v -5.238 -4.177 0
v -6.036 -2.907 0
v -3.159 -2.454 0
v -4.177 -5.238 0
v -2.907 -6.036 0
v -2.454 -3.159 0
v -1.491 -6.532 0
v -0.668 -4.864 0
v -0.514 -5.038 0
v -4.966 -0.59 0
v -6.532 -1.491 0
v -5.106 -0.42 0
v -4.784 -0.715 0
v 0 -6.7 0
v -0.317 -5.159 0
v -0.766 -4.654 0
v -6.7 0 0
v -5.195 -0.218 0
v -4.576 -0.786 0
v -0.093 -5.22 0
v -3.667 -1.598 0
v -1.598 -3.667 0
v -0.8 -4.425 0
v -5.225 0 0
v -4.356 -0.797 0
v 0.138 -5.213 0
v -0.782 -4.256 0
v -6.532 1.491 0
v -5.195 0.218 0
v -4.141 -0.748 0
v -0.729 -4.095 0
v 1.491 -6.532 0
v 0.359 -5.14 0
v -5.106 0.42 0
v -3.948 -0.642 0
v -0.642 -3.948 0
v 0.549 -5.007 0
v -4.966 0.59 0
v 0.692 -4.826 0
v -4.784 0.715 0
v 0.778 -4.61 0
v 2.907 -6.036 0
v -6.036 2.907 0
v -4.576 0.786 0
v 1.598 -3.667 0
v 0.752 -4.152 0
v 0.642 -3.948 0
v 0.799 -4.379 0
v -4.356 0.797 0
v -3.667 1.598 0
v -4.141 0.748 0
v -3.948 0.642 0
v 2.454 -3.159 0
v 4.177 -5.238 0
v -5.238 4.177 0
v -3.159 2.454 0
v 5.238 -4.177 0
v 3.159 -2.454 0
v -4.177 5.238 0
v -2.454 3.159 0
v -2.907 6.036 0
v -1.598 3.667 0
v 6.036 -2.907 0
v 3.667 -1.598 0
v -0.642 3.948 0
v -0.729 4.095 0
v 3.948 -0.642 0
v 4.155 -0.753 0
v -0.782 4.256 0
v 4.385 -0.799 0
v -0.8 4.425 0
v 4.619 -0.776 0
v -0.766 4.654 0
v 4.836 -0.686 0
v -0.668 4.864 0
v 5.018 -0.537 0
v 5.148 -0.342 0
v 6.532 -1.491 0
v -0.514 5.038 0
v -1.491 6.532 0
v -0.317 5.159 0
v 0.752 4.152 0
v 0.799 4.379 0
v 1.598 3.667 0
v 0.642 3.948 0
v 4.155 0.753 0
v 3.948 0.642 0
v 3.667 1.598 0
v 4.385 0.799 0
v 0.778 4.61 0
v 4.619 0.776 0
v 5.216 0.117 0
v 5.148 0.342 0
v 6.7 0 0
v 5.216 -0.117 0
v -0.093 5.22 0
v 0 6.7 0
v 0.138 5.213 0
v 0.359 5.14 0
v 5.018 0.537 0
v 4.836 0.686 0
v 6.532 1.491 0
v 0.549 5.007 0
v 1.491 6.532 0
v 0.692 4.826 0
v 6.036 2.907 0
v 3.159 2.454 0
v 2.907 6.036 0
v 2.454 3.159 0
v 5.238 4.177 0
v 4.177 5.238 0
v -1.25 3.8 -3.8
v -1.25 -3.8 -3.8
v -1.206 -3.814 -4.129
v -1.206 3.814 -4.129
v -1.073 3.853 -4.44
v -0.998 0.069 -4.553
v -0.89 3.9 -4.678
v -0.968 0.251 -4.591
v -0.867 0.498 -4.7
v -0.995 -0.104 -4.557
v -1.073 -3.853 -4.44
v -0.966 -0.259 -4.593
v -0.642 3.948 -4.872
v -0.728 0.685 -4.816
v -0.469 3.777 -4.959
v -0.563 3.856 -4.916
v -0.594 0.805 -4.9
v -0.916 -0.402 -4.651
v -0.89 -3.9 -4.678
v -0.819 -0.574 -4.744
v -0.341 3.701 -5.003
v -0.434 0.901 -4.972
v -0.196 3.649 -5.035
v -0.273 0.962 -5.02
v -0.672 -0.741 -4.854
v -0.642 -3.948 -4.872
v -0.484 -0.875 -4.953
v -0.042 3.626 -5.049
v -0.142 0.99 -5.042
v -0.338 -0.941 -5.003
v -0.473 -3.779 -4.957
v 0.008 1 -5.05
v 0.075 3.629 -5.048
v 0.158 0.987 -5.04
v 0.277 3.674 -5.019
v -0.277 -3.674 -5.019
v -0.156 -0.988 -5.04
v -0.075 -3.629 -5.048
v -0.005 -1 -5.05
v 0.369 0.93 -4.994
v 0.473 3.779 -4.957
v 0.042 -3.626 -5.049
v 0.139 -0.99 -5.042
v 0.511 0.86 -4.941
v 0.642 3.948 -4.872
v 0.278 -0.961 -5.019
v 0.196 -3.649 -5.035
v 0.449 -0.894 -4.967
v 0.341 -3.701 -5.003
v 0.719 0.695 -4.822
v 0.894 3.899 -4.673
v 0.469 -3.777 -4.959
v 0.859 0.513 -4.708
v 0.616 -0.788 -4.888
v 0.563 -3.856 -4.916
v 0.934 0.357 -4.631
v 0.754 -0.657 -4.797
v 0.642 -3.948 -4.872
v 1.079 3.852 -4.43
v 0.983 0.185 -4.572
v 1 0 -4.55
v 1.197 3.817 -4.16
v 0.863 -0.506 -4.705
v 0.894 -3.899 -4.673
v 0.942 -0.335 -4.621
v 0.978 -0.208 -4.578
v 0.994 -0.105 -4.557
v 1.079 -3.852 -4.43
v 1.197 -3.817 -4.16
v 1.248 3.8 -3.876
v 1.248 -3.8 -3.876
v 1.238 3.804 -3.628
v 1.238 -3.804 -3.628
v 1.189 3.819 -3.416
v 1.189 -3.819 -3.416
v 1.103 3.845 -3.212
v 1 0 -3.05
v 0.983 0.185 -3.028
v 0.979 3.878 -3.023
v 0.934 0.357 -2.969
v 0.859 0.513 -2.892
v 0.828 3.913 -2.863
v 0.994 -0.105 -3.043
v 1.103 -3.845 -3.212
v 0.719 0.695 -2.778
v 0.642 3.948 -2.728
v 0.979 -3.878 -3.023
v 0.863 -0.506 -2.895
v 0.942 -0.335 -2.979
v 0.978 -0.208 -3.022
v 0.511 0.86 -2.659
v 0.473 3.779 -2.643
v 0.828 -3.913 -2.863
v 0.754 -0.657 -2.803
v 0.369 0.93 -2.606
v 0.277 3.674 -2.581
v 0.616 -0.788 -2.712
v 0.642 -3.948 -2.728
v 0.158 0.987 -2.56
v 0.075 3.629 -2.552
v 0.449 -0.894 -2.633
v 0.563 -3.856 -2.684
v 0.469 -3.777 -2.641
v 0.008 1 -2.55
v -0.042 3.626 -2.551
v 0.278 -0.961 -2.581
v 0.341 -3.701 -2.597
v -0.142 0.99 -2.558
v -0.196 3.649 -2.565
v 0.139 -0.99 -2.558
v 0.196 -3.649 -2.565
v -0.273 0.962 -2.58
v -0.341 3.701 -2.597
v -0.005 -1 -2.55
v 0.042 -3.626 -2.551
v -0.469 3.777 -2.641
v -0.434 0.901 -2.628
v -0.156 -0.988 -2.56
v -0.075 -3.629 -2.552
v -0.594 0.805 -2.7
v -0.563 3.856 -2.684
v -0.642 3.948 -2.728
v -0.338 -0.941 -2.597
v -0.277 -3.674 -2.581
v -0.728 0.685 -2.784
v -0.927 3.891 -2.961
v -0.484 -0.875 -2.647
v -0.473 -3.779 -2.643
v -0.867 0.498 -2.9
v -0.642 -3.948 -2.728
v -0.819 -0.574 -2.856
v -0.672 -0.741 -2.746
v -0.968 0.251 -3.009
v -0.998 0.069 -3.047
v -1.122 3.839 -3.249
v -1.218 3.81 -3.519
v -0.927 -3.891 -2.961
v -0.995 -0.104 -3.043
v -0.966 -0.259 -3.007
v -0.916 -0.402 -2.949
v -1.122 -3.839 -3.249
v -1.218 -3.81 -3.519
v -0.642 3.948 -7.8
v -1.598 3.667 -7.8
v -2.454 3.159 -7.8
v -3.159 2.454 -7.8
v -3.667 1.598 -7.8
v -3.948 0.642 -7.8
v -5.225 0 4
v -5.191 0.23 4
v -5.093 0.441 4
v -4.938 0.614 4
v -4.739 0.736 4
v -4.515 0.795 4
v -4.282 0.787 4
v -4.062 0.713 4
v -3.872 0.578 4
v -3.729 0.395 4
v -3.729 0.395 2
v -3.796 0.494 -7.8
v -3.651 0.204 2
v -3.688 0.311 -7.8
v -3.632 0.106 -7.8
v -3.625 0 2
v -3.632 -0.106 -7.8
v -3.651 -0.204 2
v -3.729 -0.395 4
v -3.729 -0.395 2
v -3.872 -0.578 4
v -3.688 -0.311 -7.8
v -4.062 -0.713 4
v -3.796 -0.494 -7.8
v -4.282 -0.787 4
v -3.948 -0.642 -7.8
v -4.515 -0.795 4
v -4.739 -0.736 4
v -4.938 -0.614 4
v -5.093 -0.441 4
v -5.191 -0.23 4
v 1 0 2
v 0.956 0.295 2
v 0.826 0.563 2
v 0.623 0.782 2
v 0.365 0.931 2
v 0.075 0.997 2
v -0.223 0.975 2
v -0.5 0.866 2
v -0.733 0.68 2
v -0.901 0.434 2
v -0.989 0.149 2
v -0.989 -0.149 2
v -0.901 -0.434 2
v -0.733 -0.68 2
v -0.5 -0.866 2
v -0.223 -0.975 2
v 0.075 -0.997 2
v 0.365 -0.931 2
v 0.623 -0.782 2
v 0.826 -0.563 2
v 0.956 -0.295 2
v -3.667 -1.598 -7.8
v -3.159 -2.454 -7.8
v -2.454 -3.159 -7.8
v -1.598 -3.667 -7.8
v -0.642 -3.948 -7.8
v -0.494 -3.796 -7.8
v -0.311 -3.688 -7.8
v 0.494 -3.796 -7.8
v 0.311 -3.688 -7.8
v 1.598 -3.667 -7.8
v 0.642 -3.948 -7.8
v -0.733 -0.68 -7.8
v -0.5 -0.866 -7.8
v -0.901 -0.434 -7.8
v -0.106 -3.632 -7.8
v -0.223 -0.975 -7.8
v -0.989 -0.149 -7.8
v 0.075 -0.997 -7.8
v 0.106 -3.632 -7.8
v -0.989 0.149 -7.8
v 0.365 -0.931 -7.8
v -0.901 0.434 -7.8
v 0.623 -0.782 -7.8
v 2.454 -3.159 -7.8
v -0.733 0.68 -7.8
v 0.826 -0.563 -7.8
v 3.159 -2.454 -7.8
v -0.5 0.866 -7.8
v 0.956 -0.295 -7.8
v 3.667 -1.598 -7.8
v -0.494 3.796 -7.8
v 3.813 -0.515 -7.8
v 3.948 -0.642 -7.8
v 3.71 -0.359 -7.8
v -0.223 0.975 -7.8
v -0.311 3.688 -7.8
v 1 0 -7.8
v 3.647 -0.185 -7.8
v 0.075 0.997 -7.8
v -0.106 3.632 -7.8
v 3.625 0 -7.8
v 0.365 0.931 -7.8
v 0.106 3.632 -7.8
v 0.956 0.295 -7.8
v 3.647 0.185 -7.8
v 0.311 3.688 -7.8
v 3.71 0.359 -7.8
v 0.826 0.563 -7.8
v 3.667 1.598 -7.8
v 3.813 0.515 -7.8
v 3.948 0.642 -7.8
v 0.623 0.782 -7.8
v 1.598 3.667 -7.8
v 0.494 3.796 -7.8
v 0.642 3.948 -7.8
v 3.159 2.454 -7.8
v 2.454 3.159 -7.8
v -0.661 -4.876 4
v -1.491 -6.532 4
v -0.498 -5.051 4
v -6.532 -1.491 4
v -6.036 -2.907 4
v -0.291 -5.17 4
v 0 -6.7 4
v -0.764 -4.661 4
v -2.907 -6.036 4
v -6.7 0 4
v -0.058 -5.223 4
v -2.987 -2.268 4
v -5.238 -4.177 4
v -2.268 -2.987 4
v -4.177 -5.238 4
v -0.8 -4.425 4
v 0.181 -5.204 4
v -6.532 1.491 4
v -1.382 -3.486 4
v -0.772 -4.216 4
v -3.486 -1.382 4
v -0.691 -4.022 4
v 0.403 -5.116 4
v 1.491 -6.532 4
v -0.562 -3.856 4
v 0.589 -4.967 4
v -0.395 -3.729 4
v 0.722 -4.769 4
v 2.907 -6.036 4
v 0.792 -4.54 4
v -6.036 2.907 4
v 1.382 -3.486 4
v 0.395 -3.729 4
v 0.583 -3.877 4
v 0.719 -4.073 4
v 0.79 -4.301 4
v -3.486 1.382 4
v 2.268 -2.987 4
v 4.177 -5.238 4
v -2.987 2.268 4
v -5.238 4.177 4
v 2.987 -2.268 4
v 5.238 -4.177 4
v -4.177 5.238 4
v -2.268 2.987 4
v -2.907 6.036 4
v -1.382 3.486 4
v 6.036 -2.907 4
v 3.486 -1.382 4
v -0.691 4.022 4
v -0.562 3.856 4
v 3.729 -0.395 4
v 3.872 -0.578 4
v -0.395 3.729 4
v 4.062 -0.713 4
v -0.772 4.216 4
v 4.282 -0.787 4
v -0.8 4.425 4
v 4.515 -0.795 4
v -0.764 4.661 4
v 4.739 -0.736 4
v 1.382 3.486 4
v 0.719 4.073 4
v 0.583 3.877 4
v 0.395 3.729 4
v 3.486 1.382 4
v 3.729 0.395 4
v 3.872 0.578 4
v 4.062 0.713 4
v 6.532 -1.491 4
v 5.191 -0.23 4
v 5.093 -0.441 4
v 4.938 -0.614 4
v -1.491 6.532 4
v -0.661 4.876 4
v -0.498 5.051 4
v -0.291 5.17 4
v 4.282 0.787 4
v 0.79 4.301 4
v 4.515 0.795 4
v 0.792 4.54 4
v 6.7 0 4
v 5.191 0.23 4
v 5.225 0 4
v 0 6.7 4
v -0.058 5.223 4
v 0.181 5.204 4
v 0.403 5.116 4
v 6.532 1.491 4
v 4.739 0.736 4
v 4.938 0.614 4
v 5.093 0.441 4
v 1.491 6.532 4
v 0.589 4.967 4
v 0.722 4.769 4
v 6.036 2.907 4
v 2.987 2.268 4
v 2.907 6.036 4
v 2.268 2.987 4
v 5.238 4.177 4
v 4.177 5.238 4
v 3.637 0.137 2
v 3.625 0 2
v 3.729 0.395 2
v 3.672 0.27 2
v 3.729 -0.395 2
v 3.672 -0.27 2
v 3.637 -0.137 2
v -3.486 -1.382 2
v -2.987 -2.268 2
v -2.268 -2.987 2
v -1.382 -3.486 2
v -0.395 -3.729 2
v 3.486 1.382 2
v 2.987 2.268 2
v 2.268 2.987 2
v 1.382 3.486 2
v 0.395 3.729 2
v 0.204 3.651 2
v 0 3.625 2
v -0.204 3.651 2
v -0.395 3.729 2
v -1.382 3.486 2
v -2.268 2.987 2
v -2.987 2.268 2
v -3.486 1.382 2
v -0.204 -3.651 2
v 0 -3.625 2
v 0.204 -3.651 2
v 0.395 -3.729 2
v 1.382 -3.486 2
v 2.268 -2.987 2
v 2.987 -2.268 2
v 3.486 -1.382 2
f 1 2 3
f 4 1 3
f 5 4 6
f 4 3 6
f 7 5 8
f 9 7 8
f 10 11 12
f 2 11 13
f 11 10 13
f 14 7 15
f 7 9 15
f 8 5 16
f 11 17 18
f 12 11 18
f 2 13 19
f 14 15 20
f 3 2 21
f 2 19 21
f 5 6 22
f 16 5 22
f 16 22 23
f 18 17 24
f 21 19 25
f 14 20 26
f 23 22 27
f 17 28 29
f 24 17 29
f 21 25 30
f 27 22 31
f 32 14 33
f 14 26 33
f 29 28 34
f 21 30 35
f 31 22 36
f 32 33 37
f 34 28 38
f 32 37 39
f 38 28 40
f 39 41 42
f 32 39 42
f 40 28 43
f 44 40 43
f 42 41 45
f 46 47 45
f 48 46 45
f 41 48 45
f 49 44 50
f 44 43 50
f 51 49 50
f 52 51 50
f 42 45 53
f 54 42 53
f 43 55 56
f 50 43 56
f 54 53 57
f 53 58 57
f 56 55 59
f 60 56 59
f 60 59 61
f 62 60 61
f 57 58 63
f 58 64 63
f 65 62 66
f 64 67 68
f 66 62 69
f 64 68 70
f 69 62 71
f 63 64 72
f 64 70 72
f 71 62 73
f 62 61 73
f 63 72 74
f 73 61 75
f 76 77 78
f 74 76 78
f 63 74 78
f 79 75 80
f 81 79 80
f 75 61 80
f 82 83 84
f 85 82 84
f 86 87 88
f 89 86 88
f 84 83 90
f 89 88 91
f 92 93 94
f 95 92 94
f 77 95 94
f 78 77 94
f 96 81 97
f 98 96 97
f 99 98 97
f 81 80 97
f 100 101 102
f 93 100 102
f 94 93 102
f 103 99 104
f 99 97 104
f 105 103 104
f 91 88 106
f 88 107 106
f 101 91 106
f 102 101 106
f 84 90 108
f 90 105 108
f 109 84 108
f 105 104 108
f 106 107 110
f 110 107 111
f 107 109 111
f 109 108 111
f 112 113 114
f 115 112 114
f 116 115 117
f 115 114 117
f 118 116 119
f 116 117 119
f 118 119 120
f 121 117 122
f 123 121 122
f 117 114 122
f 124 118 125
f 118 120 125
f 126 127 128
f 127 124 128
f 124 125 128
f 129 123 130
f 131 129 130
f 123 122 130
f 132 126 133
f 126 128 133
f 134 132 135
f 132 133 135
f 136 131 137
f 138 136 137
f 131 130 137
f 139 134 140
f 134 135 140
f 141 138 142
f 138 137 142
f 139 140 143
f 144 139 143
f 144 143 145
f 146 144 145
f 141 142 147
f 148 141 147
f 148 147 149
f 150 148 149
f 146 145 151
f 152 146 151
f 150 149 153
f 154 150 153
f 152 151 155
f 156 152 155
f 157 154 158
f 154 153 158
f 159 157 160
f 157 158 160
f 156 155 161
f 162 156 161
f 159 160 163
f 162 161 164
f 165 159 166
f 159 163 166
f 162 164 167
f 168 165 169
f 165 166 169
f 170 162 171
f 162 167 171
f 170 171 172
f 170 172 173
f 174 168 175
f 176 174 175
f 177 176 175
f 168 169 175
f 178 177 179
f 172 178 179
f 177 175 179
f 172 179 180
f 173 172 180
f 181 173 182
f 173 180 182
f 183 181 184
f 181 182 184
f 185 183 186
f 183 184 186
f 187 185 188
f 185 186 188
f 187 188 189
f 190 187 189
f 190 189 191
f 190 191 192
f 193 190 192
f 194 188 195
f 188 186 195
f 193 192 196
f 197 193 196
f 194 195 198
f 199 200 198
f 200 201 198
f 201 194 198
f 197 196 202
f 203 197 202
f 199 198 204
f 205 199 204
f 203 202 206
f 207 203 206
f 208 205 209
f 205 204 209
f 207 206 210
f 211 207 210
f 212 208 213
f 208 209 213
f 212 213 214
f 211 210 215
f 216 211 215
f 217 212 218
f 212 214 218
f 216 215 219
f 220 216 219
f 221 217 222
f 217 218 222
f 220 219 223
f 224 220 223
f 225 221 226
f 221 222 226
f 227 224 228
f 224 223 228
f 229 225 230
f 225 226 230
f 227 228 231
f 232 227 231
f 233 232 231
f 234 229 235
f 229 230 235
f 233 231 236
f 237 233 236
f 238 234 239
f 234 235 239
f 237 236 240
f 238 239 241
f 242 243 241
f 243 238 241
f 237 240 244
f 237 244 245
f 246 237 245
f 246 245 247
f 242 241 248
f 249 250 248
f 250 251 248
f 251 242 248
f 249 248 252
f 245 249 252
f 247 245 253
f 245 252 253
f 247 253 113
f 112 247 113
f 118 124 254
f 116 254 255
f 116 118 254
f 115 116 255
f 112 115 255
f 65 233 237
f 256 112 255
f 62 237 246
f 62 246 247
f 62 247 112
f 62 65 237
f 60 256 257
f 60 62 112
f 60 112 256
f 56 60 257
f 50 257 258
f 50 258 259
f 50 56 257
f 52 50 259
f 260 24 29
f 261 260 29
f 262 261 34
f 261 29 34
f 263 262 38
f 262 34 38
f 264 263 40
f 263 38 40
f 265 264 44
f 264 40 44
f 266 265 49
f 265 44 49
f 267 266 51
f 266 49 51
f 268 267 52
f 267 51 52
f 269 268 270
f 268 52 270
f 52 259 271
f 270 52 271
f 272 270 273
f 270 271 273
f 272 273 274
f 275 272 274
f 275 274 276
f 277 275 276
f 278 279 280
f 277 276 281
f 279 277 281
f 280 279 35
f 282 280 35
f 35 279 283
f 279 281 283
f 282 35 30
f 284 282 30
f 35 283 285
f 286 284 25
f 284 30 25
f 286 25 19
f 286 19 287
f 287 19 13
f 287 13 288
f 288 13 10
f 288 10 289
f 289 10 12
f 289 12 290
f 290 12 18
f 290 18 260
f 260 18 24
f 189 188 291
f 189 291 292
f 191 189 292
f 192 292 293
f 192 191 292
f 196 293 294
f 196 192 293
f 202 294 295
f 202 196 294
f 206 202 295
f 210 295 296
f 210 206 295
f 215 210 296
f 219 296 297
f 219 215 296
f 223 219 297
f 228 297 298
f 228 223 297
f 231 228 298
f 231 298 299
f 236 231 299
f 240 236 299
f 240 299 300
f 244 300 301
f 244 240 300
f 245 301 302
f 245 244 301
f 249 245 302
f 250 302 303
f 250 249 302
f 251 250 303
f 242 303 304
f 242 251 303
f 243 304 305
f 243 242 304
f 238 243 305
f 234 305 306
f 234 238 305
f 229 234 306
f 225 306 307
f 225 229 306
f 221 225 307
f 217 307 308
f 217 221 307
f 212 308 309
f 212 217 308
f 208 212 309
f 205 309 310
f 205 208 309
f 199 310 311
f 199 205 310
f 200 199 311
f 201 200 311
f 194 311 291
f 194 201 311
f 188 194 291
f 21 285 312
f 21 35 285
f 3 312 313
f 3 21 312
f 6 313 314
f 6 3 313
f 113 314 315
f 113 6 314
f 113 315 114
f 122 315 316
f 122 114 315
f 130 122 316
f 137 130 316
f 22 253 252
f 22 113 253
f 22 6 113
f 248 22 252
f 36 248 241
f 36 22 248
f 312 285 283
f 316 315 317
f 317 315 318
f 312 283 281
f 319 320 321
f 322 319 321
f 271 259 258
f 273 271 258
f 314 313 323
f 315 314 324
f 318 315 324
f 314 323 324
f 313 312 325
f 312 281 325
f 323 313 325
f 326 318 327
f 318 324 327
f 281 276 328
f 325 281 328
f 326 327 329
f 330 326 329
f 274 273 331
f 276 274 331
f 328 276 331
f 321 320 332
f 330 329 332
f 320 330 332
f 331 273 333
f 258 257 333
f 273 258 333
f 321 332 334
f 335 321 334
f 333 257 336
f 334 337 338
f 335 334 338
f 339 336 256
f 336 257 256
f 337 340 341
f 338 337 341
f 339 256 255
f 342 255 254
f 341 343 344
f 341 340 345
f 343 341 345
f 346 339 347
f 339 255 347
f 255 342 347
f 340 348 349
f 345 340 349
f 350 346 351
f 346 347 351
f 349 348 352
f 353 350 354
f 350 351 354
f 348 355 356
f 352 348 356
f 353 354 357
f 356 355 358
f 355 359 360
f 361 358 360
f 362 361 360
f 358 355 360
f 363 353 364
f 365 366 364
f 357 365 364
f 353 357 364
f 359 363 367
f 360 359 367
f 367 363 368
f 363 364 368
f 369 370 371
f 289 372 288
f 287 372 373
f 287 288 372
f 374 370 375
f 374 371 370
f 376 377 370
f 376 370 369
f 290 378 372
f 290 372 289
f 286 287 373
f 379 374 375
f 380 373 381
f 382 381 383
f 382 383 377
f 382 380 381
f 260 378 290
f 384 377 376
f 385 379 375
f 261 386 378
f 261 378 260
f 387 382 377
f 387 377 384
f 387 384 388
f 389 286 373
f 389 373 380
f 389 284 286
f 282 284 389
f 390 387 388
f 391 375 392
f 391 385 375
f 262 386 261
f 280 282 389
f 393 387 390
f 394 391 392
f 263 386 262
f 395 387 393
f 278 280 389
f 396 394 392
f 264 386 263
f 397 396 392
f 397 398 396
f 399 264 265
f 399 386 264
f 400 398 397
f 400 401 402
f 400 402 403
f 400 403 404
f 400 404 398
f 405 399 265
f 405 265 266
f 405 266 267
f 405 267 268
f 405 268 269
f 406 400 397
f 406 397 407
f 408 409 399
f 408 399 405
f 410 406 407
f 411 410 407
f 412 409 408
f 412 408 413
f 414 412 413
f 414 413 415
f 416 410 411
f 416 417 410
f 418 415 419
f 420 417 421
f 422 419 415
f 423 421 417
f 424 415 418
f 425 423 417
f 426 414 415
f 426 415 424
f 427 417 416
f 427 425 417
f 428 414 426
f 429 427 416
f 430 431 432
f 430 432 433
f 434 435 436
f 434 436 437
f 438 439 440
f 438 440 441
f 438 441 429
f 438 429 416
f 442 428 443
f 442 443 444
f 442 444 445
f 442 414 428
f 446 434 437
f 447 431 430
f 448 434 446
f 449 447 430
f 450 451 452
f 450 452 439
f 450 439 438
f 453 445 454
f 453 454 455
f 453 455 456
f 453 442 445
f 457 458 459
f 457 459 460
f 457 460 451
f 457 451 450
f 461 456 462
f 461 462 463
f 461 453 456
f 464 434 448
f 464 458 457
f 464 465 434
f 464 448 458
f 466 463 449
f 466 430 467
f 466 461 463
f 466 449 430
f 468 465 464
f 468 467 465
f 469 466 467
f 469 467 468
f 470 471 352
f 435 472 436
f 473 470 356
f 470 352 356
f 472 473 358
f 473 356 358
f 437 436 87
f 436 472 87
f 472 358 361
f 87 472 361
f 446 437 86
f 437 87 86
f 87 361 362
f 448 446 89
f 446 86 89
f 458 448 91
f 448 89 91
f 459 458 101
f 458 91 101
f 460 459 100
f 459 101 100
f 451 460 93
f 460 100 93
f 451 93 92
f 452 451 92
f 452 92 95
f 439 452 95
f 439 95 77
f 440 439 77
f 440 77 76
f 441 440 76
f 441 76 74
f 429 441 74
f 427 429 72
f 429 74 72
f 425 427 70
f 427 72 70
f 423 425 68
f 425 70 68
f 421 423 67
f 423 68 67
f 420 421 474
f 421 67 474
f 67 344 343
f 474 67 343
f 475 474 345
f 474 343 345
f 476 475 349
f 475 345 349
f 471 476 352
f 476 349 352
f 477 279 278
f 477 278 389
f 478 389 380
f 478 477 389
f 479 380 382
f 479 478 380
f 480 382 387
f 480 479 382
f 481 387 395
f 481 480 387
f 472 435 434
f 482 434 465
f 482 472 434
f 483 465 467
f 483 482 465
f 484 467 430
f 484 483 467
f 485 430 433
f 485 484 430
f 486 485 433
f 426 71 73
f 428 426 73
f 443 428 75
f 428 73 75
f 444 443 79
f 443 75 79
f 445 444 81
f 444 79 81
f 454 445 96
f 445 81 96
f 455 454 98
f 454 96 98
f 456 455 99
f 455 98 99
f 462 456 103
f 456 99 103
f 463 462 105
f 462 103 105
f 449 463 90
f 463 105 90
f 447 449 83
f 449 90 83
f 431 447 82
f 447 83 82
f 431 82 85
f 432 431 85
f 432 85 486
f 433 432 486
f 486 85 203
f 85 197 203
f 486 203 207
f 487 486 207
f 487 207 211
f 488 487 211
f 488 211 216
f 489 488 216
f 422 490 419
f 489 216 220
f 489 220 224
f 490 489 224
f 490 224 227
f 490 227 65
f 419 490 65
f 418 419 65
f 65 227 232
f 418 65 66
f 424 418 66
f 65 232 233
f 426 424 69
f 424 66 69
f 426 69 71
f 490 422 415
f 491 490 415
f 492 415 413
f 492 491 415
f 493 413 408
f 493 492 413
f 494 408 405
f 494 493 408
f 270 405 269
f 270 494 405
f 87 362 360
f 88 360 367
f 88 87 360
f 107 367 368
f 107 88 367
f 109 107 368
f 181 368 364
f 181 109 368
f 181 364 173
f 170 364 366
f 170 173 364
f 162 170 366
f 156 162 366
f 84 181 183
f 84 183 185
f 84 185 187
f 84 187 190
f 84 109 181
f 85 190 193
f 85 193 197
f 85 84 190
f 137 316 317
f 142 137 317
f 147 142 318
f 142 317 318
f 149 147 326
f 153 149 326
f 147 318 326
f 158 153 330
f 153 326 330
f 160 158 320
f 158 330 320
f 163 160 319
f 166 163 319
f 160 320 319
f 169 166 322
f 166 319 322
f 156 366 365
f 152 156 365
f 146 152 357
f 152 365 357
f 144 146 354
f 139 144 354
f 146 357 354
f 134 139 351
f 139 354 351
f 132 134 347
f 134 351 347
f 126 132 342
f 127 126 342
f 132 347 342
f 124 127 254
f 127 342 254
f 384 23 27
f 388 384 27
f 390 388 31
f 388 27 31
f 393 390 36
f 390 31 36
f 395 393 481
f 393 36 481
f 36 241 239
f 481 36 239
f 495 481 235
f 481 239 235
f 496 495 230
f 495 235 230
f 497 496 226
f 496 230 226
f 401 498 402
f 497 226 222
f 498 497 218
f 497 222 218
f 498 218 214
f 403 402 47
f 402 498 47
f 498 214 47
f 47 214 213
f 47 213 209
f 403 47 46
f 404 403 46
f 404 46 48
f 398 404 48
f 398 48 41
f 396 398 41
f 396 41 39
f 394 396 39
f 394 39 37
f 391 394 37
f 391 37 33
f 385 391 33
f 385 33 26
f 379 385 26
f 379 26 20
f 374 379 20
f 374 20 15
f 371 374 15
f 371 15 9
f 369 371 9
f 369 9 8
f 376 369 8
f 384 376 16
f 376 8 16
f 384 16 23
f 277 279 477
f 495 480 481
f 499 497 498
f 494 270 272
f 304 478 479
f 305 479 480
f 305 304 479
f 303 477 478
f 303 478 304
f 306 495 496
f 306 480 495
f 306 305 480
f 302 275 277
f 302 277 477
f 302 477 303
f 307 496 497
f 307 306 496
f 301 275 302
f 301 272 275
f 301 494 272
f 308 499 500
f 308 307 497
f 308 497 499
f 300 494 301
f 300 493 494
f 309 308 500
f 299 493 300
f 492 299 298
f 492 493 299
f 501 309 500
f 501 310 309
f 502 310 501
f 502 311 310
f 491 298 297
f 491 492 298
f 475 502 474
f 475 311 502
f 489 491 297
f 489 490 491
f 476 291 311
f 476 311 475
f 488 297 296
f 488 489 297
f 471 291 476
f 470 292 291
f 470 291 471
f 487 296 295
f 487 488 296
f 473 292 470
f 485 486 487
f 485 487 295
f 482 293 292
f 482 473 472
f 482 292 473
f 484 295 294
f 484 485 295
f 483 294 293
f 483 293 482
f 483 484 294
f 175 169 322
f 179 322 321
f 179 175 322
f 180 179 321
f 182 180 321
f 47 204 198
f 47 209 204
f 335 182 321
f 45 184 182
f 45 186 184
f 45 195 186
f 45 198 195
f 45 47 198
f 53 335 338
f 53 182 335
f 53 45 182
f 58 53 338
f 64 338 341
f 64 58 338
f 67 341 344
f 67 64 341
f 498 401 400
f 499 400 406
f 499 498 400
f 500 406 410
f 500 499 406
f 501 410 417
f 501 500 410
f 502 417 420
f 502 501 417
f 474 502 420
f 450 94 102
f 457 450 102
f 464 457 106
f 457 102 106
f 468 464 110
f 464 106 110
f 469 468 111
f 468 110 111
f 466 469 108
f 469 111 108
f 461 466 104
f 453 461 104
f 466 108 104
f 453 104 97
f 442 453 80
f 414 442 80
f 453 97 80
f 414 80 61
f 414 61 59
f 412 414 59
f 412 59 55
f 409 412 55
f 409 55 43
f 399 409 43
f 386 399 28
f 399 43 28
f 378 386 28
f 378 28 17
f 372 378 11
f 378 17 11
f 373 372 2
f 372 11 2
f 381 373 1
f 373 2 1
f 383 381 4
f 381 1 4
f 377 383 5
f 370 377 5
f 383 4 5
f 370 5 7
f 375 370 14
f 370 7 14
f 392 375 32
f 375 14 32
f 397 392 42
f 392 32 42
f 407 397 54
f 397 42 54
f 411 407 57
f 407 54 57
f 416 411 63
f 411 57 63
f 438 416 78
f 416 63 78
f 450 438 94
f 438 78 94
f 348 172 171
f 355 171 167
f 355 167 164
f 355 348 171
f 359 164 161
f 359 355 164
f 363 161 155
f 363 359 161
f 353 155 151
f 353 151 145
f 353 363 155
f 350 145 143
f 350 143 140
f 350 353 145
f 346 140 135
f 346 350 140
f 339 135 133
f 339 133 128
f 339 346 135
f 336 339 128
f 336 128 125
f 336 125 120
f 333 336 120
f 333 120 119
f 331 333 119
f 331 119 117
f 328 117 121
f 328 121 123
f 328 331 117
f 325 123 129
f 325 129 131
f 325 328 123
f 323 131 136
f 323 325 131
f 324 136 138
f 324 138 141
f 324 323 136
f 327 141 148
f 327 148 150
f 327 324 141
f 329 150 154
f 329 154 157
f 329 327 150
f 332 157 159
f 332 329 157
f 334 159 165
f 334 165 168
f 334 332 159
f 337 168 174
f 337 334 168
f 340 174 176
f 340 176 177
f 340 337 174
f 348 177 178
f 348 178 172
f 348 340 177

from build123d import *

# Parameters (mm, degrees)
SKIZZE1_R                       = 6.7
SKIZZE1_R_2                     = 3.75
SKIZZE1_R_3                     = 4
AUFSATZ_LINEAR_AUSTRAGEN1_DEPTH = 4
SKIZZE1_4_R                     = 4
SKIZZE1_4_R_2                   = 3.75
SKIZZE1_4_R_3                   = 1
AUFSATZ_LINEAR_AUSTRAGEN2_DEPTH = 7.8
SKIZZE1_6_R                     = 4
SKIZZE1_6_R_2                   = 1
AUFSATZ_LINEAR_AUSTRAGEN3_DEPTH = 2
M2_GEWINDEBOHRUNG1_D            = 1.6
M3_GEWINDEBOHRUNG1_D            = 2.5


with BuildPart() as part:
    # Skizze1 → Aufsatz-Linear austragen1 (new body)
    with BuildSketch(Plane.XY):
        Circle(SKIZZE1_R)
        Circle(SKIZZE1_R_2, mode=Mode.SUBTRACT)
        Circle(SKIZZE1_R_3)
        Circle(SKIZZE1_R_2, mode=Mode.SUBTRACT)
    extrude(amount=AUFSATZ_LINEAR_AUSTRAGEN1_DEPTH)

    # Skizze1_4 → Aufsatz-Linear austragen2 (add)
    with BuildSketch(Plane.XY):
        Circle(SKIZZE1_4_R)
        Circle(SKIZZE1_4_R_2, mode=Mode.SUBTRACT)
        Circle(SKIZZE1_4_R_2)
        Circle(SKIZZE1_4_R_3, mode=Mode.SUBTRACT)
    extrude(amount=-AUFSATZ_LINEAR_AUSTRAGEN2_DEPTH)

    # Skizze1_6 → Aufsatz-Linear austragen3 (add)
    with BuildSketch(Plane.XY):
        Circle(SKIZZE1_6_R)
        Circle(SKIZZE1_6_R_2, mode=Mode.SUBTRACT)
    extrude(amount=AUFSATZ_LINEAR_AUSTRAGEN3_DEPTH)

    # M2 Gewindebohrung1 (through all)
    with Locations(Plane.XY.offset(4)):
        with Locations((4.425, 0), (0, -4.425), (-4.425, 0), (0, 4.425)):
            Hole(M2_GEWINDEBOHRUNG1_D / 2)

    # M3 Gewindebohrung1 (through all)
    with Locations(Plane(origin=(0, 3.625, -3.8), x_dir=(1, 0, 0), z_dir=(0, 1, 0))):
        with Locations((0, 0)):
            Hole(M3_GEWINDEBOHRUNG1_D / 2)


solid = part.part
